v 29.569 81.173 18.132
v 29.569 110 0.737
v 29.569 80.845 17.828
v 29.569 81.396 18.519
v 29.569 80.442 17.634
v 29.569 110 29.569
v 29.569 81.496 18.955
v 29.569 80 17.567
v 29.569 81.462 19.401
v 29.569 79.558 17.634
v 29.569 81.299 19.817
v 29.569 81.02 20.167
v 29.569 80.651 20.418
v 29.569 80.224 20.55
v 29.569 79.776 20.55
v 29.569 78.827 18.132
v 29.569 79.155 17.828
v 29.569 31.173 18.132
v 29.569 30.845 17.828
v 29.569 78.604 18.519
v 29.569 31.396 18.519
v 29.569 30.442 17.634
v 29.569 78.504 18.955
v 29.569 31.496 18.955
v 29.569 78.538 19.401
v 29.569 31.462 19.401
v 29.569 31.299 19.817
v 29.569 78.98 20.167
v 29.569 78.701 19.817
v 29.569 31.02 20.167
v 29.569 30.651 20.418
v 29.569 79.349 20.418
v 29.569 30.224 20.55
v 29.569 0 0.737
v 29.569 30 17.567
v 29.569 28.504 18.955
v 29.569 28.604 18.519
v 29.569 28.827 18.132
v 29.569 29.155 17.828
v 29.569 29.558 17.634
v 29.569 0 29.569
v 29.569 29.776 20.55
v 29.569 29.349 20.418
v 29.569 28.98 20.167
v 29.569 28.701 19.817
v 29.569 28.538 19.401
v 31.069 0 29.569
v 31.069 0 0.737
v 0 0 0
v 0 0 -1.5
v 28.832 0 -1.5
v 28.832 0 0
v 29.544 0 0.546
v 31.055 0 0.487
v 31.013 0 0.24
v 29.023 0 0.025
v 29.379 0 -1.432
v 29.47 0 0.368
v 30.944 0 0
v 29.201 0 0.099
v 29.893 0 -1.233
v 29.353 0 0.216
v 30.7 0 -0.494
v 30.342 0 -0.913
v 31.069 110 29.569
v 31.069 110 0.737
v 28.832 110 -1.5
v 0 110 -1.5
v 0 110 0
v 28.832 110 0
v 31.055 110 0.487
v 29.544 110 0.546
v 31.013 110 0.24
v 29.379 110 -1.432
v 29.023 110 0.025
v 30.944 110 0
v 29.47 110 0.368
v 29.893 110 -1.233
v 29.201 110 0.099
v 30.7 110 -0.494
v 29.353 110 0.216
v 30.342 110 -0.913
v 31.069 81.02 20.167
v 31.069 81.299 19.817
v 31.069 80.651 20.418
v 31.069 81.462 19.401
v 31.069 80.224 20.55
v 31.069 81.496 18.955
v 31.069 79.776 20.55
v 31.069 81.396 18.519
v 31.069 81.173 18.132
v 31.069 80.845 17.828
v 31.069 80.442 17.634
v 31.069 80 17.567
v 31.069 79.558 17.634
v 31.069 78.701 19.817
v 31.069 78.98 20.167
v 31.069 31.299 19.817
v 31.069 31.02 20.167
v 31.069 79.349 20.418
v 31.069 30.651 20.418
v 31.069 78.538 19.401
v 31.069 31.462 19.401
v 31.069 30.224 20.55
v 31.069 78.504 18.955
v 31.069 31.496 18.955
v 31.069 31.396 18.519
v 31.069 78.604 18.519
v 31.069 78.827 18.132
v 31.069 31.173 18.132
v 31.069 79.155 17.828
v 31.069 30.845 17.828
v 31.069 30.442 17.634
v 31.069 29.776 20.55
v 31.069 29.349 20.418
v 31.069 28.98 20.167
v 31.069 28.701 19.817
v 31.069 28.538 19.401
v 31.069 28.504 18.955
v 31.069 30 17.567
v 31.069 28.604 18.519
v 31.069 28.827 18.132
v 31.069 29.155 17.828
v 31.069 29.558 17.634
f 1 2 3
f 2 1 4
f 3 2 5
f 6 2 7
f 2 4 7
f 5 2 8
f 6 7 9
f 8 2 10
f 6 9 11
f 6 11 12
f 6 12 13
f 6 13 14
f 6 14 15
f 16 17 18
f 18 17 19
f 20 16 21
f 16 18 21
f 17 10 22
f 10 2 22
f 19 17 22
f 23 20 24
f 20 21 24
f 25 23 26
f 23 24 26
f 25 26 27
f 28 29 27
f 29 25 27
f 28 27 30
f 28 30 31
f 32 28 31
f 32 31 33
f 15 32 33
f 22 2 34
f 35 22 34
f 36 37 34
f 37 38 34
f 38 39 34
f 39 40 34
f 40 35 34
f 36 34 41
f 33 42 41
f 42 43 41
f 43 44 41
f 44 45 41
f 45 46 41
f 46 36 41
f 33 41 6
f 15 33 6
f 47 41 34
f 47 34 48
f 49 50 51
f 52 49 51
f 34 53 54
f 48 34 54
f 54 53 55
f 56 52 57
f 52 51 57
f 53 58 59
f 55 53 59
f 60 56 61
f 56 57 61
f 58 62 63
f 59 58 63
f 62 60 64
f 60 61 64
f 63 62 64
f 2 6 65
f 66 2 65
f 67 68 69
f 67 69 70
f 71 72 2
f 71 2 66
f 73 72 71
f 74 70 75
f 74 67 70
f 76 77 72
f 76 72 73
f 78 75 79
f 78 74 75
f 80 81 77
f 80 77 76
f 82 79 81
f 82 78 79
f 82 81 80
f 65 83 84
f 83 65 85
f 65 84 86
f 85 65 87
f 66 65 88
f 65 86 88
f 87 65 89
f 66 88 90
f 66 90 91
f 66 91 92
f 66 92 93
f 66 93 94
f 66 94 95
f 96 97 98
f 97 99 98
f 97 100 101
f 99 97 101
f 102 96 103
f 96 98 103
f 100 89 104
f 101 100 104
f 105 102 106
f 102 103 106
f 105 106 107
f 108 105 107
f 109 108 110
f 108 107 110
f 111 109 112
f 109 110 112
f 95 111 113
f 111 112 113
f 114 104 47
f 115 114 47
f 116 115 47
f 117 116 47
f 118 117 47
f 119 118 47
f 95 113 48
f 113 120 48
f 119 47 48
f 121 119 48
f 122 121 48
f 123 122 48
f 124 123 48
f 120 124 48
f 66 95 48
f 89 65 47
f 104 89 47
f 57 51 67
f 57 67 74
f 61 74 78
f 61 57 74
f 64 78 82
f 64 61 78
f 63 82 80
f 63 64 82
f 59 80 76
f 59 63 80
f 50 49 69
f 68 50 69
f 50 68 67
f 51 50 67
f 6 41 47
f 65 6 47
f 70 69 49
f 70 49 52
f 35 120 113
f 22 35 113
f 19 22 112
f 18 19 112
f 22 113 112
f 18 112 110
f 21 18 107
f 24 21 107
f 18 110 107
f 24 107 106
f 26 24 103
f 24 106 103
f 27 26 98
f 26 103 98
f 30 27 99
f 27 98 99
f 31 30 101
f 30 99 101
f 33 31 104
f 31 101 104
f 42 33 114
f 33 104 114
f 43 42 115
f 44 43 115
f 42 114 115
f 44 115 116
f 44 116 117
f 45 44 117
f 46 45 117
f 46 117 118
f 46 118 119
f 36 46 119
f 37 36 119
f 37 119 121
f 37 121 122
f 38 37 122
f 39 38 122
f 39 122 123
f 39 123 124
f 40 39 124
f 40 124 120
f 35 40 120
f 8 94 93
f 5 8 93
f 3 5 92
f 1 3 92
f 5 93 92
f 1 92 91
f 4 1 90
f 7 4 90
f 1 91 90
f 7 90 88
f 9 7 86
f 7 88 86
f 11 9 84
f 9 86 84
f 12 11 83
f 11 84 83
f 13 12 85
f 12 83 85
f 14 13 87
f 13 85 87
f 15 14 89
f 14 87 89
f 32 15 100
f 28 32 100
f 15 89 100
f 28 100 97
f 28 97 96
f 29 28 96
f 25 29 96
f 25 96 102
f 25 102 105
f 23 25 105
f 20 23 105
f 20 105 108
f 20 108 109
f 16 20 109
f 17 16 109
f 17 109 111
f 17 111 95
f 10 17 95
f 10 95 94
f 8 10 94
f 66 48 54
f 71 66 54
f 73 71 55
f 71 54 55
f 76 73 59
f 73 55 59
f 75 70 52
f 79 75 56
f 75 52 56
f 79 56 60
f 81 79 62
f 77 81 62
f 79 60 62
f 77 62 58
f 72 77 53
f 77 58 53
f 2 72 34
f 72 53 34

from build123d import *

# Parameters (mm, degrees)
SKETCH2_W              = 60
SKETCH2_H              = 110
BASE_FLANGE1_DEPTH     = 1.5
SKETCHED_BEND1_DEPTH   = 110
SKETCHED_BEND1_2_DEPTH = 110
F_3_0MM_DOWEL_HOLE2_D  = 3


# Read off the part's stored shape, not the designer's step: Sketched Bend1
# Sheet-metal steps are written as plain solids
with BuildPart() as part:
    # Sketch2 → Base-Flange1 (new body)
    with BuildSketch(Plane.XY):
        with Locations((30, 55)):
            Rectangle(SKETCH2_W, SKETCH2_H)
    extrude(amount=-BASE_FLANGE1_DEPTH)

    # Sketched Bend1 outline → Sketched Bend1 (cut)
    with BuildSketch(Plane(origin=(0, 0, 0), x_dir=(1, 0, 0), z_dir=(0, 1, 0))):
        with BuildLine():
            ThreePointArc((28.83242709, 1.5), (30.127591172, 1.086838938), (30.944250946, 0))
            Line((30.944250946, 0), (60, 0))
            Line((60, 0), (60, 1.5))
            Line((60, 1.5), (28.83242709, 1.5))
        make_face()
    extrude(amount=SKETCHED_BEND1_DEPTH, mode=Mode.SUBTRACT)

    # Sketched Bend1 2 outline → Sketched Bend1 2 (add)
    with BuildSketch(Plane(origin=(0, 0, 0), x_dir=(1, 0, 0), z_dir=(0, 1, 0))):
        with BuildLine():
            Line((29.56902709, -0.7366), (29.56902709, -29.56902709))
            Line((29.56902709, -29.56902709), (31.06902709, -29.56902709))
            Line((31.06902709, -29.56902709), (31.06902709, -0.7366))
            ThreePointArc((31.06902709, -0.7366), (31.037612433, -0.363053267), (30.944250946, 0))
            Line((30.944250946, 0), (28.83242709, 0))
            ThreePointArc((28.83242709, 0), (29.353281945, -0.215745145), (29.56902709, -0.7366))
        make_face()
    extrude(amount=SKETCHED_BEND1_2_DEPTH)

    # Ø3.0mm Dowel Hole2 (through all)
    with Locations(Plane(origin=(29.56902709, -1.119987894, 38.304969563), x_dir=(0, 0, 1), z_dir=(-1, 0, 0))):
        with Locations((-19.237938753, 81.119987894), (-19.237938753, 31.119987894)):
            Hole(F_3_0MM_DOWEL_HOLE2_D / 2)


solid = part.part
